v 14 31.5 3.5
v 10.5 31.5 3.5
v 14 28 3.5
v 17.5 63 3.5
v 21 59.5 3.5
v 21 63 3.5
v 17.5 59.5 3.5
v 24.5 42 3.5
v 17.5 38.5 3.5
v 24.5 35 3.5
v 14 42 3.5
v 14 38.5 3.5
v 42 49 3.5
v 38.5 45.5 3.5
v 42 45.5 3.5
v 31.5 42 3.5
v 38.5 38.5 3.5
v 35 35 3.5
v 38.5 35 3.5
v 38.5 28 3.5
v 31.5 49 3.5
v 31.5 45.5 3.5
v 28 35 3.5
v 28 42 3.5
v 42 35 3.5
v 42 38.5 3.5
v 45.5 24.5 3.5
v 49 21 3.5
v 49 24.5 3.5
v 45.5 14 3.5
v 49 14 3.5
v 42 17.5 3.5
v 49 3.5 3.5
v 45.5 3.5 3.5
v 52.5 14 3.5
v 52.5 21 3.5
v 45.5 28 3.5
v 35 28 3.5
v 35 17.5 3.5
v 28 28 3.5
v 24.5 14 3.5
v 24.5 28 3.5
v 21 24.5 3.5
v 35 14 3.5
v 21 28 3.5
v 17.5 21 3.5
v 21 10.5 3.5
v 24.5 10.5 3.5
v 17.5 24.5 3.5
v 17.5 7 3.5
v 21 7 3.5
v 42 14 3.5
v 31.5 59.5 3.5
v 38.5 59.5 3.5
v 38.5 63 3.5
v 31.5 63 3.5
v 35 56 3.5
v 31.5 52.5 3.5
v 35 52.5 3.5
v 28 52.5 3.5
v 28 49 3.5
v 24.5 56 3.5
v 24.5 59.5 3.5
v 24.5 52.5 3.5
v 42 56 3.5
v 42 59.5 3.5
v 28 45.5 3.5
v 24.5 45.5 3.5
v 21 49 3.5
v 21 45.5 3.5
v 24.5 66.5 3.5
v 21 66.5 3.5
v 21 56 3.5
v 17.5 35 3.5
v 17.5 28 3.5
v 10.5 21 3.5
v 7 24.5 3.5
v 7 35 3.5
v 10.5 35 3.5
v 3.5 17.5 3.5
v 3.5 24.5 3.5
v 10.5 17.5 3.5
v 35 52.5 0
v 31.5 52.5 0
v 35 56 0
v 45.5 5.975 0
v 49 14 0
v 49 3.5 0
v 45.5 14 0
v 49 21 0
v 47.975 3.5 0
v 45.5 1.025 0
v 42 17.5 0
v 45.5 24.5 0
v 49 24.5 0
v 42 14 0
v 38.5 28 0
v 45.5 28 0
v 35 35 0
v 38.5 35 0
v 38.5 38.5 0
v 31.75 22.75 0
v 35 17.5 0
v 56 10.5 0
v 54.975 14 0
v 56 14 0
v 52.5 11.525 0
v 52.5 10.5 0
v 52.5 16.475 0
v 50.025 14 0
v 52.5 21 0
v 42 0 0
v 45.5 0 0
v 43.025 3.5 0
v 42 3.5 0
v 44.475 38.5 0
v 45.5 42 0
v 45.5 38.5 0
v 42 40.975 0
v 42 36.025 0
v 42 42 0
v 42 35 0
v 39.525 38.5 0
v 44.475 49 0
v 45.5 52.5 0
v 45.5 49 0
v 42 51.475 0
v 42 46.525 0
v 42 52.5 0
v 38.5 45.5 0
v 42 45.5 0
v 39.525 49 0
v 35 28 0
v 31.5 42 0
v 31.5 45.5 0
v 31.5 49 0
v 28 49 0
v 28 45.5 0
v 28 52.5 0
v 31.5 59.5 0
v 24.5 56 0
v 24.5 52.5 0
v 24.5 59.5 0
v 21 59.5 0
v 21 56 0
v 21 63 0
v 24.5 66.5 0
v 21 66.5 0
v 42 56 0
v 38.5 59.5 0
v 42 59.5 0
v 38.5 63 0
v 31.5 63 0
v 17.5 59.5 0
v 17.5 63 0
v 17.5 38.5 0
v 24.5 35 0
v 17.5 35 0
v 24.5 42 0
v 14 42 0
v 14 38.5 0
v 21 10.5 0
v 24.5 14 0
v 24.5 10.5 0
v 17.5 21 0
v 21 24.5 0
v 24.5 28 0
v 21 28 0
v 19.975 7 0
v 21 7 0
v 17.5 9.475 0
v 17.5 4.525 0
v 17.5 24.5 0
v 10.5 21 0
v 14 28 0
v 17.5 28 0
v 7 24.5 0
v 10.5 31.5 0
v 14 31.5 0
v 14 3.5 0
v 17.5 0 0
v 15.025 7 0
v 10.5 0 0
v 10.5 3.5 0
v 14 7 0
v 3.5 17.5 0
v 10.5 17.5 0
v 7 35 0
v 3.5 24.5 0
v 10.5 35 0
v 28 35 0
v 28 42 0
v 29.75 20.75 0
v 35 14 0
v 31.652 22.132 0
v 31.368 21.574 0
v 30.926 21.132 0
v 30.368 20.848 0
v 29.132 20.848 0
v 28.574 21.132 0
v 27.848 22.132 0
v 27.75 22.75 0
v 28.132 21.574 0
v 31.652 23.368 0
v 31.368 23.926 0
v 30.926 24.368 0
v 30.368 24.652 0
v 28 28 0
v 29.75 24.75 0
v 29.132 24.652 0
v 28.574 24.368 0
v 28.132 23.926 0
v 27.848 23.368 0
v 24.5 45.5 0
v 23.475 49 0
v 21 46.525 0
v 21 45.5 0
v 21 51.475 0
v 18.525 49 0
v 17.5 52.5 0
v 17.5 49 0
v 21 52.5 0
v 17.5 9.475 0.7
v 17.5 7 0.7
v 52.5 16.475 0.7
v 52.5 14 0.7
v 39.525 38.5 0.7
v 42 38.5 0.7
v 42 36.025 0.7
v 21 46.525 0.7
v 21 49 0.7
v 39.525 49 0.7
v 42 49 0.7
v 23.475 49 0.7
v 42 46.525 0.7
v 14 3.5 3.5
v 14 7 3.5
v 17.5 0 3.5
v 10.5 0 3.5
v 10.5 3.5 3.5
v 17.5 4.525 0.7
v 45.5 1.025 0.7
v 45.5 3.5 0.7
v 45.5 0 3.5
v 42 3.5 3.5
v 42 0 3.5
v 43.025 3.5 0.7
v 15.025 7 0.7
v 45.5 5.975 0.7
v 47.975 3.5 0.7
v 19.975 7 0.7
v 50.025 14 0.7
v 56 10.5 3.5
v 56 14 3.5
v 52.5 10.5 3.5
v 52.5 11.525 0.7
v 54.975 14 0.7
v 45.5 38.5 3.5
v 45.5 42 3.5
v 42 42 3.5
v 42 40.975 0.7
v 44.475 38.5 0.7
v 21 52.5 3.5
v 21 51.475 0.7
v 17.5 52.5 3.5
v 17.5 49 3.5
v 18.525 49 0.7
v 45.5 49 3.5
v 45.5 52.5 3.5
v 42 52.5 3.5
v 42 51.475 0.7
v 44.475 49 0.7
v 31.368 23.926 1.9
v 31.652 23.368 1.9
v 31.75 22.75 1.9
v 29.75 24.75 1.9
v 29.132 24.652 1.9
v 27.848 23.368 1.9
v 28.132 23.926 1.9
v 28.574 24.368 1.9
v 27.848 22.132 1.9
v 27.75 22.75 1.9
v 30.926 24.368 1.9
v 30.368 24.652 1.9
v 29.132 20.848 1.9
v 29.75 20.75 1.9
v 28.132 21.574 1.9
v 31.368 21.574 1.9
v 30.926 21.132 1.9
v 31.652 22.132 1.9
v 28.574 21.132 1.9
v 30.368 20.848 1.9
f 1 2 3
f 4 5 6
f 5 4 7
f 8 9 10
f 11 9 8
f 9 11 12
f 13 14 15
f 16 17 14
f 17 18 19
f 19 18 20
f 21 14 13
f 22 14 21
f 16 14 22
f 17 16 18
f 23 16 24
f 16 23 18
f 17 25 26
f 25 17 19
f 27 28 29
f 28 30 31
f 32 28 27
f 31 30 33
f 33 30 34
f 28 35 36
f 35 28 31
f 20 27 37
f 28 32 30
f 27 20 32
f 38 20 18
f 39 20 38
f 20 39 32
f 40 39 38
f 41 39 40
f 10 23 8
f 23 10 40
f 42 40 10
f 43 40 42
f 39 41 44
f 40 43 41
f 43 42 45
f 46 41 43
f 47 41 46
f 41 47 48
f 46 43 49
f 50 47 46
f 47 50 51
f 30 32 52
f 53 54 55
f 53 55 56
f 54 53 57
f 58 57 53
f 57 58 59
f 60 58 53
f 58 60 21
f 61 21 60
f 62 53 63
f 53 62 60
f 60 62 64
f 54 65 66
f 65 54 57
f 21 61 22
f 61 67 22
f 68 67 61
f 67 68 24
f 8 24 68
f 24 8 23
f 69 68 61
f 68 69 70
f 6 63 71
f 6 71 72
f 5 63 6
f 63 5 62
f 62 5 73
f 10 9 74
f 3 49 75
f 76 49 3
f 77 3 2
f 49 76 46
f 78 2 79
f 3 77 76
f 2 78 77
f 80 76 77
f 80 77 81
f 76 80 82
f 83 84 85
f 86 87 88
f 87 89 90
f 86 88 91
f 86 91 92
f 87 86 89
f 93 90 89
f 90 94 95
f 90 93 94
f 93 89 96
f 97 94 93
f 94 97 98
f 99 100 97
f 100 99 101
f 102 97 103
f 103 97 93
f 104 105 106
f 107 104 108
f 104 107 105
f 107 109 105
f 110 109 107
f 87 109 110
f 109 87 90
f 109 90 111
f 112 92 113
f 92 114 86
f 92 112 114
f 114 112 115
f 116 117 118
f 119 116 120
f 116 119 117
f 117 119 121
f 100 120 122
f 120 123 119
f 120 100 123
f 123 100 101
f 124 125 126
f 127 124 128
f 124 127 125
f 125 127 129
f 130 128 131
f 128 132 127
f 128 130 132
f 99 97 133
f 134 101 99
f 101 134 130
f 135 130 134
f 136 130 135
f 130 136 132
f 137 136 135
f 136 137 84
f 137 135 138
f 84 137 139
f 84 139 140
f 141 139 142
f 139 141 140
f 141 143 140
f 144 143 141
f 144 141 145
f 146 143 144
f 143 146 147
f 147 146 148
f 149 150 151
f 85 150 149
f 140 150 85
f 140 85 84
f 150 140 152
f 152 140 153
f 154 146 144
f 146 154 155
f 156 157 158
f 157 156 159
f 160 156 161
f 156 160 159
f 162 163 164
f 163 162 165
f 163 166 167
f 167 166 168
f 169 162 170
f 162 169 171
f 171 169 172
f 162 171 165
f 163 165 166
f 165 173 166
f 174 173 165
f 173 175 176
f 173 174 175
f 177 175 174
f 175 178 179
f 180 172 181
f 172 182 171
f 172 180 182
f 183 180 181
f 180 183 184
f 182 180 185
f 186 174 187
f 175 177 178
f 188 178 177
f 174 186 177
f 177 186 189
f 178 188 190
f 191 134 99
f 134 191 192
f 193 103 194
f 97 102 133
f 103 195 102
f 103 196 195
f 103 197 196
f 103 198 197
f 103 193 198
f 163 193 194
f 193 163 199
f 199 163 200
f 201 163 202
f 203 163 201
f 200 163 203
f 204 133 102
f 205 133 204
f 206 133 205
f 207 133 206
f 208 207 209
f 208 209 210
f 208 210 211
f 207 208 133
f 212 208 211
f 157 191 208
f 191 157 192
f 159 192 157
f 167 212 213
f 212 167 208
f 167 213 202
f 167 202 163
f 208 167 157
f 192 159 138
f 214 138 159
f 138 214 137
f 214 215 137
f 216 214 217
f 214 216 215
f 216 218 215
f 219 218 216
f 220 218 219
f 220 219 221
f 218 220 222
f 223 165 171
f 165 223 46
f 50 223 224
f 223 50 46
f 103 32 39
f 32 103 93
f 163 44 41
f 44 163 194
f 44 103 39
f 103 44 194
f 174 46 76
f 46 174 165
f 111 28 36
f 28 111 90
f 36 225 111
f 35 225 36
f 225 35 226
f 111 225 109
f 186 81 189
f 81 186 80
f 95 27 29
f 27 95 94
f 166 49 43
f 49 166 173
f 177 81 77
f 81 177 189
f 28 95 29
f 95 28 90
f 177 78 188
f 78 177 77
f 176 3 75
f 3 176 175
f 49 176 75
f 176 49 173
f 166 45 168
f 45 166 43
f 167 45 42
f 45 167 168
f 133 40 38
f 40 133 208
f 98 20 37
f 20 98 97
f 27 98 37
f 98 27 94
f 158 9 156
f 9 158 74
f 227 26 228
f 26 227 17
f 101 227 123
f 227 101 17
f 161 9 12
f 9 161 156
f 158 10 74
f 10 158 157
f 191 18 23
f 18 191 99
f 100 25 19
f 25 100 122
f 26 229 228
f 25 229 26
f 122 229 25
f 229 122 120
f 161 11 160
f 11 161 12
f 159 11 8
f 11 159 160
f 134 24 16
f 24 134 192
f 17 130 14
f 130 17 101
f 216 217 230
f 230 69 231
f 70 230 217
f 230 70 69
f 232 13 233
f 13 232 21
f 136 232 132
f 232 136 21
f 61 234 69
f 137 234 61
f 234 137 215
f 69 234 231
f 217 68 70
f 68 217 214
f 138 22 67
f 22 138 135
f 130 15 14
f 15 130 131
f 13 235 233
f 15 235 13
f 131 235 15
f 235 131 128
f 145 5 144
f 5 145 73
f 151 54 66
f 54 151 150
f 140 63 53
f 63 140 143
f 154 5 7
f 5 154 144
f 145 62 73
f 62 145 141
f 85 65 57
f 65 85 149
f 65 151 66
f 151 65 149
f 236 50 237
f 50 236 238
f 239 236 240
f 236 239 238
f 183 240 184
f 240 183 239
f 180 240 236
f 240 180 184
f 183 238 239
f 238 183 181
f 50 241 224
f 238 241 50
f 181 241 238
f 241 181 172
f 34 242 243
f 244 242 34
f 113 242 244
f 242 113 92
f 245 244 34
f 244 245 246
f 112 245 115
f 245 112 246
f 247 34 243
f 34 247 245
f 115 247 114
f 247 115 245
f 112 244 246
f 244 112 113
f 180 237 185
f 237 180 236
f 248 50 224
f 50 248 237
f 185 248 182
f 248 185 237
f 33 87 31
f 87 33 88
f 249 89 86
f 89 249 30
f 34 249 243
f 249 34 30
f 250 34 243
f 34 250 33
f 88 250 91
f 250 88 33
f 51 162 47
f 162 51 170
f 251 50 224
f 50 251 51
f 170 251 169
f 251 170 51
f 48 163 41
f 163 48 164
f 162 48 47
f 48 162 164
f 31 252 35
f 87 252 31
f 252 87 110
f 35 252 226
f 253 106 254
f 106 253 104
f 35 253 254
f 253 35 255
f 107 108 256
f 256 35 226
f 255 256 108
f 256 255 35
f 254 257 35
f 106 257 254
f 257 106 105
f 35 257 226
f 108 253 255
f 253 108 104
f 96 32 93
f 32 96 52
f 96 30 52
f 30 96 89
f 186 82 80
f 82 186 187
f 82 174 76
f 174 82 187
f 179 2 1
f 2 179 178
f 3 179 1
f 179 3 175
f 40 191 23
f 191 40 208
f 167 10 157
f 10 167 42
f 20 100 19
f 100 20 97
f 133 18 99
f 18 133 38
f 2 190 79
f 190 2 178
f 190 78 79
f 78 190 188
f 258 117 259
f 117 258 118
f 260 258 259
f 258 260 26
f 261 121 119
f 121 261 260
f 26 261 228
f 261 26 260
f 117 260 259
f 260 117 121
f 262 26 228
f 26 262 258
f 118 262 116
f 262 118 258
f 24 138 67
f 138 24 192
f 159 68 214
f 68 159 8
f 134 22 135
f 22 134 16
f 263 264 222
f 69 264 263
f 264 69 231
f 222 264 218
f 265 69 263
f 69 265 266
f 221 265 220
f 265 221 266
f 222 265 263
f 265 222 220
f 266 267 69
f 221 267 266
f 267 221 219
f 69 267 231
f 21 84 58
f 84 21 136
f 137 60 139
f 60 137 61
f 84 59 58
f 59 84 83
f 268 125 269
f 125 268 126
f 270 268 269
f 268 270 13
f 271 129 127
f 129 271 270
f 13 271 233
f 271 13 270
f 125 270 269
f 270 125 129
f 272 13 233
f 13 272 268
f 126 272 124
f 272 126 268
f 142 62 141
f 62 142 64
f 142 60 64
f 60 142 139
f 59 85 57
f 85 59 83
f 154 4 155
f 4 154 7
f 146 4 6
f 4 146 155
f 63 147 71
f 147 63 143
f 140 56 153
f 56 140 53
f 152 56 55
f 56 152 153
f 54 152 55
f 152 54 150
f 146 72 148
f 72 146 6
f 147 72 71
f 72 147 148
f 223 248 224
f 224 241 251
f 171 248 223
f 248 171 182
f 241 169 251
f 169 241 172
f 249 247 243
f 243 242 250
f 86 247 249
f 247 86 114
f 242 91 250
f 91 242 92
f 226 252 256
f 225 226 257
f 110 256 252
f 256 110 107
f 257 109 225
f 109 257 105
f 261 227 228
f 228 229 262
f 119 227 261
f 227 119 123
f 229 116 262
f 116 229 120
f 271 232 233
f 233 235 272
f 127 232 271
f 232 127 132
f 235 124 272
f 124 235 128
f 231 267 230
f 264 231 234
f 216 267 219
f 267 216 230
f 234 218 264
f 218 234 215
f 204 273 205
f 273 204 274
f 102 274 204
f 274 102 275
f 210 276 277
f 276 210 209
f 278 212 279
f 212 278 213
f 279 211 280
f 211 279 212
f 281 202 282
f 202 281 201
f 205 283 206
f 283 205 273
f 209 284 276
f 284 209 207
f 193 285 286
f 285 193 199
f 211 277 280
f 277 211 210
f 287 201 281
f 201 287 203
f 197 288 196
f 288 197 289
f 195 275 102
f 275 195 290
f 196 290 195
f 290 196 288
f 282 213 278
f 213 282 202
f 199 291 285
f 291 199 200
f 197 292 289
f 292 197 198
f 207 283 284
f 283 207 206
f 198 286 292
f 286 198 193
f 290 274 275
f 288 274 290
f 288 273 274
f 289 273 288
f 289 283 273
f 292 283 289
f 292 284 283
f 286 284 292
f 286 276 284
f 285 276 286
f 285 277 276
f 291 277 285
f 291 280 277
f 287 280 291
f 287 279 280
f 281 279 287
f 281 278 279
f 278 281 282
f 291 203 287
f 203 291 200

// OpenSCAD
// file: 3dPixel.scad
module 3dPixel(xpos, ypos, xsi=3.5, ysi, zsi, gap=0.0)
{
    xsize = xsi;
    ysize = (ysi==undef)? xsi : ysi;
    zsize = (zsi==undef)? xsi : zsi;
    translate(v=[xpos*(gap+xsize),ypos*(gap+ysize),0])
    cube(size=[xsize, ysize, zsize]);
}
module RingHole(xpos, ypos, xsi=3.5, ysi, zsi, gap=0.0)
{
    xsize = xsi;
    ysize = (ysi==undef)? xsi : ysi;
    zsize = (zsi==undef)? xsi : zsi;
    difference(){
        3dPixel(xpos, ypos, xsize, ysize, zsize, gap);
        translate(v=[xpos*(gap+xsize)+0.5*xsize,ypos*(gap+ysize)+0.5*ysize,0.5*zsize])
        cylinder(h=1.1*zsize, r=0.4*xsize, $fn=20, center=true);
    }
}
module PixelSteg(x1, y1, x2, y2, rot=45, xsi=3.5, ysi, zsi, gap=0.0)
{
    xsize = xsi;
    ysize = (ysi==undef)? xsi : ysi;
    zsize = (zsi==undef)? xsi : zsi;
    translate(v=[(x1+x2)/2*(gap+xsize)+0.5*xsize,(y1+y2)/2*(gap+ysize)+0.5*ysize,zsize/5/2])
    rotate([0,0,rot])
    cube(size=[((x1!=x2)?max(abs(x1-x2),1):max(abs(y1-y2),1))*xsize, ysize, zsize/5],center=true);
}

module MagnetHole(xpos, ypos, xsi=3.5, ysi, zsi, gap=0.0, magnetHeight = 2.0, magnetDiam = 4.0)
{
    xsize = xsi;
    ysize = (ysi==undef)? xsi : ysi;
    zsize = (zsi==undef)? xsi : zsi;
    translate(v=[xpos*(gap+xsize)+0.5*xsize,ypos*(gap+ysize)+0.5*ysize,magnetHeight/2-magnetHeight*0.1])
    cylinder(h=magnetHeight*1.1, r=magnetDiam/2, $fn=20, center=true);
}

3dPixel(0,0);
RingHole(1,1);
difference()
{
    3dPixel(2,2);
    MagnetHole(2,2);
}
// main file
use <3dPixel.scad>;

module hshbLogo()
{
    union()
    {
        3dPixel(3,0);
        3dPixel(4,0);
        3dPixel(12,0);
        3dPixel(4,1);
        3dPixel(13,1);
        3dPixel(5,2);
        3dPixel(13,2);
        3dPixel(5,3);
        3dPixel(6,3);
        3dPixel(13,3);
        3dPixel(15,3);
        for(i = [5:9])
        {
            3dPixel(i,4);
        }
        3dPixel(12,4);
        3dPixel(13,4);
        3dPixel(14,4);
        3dPixel(1,5);
        3dPixel(2,5);
        for(i = [5:14])
        {
            3dPixel(i,5);
        }
        for(i = [1:13])
        {
            3dPixel(i,6);
        }
        for(i = [2:4])
        {
            3dPixel(i,7);
        }
        for(i = [6:12])
        {
            3dPixel(i,7);
        }
        3dPixel(2,8);
        3dPixel(3,8);
        3dPixel(7,8);
        3dPixel(10,8);
        3dPixel(2,9);
        3dPixel(7,9);
        3dPixel(10,9);
        for(i = [5:11])
        {
            3dPixel(i,10);
        }
        for(i = [4:10])
        {
            3dPixel(i,11);
        }
        3dPixel(12,11);
        3dPixel(7,12);
        3dPixel(9,12);
        3dPixel(10,12);
        for(i = [6:11])
        {
            3dPixel(i,13);
        }
        3dPixel(5,14);
        3dPixel(8,14);
        3dPixel(12,14);
        3dPixel(7,15);
        3dPixel(9,15);
        for(i = [6:7])
        {
            3dPixel(i,16);
        }
        for(i = [9:11])
        {
            3dPixel(i,16);
        }
        3dPixel(8,16);
        3dPixel(8,15);
        //RingHole(8,15);
        3dPixel(5,17);
        3dPixel(6,17);
        3dPixel(9,17);
        3dPixel(10,17);
        3dPixel(6,18);
    }
    PixelSteg(4,1,5,2);
    PixelSteg(12,0,13,1);
    PixelSteg(14,3,15,4);
    PixelSteg(11,10,12,11);
    PixelSteg(11,13,12,14);
    PixelSteg(6,13,5,14);
}


//Logo mit Loch f?r Magnet
difference()
{
    hshbLogo();
    MagnetHole(8,6);
}
